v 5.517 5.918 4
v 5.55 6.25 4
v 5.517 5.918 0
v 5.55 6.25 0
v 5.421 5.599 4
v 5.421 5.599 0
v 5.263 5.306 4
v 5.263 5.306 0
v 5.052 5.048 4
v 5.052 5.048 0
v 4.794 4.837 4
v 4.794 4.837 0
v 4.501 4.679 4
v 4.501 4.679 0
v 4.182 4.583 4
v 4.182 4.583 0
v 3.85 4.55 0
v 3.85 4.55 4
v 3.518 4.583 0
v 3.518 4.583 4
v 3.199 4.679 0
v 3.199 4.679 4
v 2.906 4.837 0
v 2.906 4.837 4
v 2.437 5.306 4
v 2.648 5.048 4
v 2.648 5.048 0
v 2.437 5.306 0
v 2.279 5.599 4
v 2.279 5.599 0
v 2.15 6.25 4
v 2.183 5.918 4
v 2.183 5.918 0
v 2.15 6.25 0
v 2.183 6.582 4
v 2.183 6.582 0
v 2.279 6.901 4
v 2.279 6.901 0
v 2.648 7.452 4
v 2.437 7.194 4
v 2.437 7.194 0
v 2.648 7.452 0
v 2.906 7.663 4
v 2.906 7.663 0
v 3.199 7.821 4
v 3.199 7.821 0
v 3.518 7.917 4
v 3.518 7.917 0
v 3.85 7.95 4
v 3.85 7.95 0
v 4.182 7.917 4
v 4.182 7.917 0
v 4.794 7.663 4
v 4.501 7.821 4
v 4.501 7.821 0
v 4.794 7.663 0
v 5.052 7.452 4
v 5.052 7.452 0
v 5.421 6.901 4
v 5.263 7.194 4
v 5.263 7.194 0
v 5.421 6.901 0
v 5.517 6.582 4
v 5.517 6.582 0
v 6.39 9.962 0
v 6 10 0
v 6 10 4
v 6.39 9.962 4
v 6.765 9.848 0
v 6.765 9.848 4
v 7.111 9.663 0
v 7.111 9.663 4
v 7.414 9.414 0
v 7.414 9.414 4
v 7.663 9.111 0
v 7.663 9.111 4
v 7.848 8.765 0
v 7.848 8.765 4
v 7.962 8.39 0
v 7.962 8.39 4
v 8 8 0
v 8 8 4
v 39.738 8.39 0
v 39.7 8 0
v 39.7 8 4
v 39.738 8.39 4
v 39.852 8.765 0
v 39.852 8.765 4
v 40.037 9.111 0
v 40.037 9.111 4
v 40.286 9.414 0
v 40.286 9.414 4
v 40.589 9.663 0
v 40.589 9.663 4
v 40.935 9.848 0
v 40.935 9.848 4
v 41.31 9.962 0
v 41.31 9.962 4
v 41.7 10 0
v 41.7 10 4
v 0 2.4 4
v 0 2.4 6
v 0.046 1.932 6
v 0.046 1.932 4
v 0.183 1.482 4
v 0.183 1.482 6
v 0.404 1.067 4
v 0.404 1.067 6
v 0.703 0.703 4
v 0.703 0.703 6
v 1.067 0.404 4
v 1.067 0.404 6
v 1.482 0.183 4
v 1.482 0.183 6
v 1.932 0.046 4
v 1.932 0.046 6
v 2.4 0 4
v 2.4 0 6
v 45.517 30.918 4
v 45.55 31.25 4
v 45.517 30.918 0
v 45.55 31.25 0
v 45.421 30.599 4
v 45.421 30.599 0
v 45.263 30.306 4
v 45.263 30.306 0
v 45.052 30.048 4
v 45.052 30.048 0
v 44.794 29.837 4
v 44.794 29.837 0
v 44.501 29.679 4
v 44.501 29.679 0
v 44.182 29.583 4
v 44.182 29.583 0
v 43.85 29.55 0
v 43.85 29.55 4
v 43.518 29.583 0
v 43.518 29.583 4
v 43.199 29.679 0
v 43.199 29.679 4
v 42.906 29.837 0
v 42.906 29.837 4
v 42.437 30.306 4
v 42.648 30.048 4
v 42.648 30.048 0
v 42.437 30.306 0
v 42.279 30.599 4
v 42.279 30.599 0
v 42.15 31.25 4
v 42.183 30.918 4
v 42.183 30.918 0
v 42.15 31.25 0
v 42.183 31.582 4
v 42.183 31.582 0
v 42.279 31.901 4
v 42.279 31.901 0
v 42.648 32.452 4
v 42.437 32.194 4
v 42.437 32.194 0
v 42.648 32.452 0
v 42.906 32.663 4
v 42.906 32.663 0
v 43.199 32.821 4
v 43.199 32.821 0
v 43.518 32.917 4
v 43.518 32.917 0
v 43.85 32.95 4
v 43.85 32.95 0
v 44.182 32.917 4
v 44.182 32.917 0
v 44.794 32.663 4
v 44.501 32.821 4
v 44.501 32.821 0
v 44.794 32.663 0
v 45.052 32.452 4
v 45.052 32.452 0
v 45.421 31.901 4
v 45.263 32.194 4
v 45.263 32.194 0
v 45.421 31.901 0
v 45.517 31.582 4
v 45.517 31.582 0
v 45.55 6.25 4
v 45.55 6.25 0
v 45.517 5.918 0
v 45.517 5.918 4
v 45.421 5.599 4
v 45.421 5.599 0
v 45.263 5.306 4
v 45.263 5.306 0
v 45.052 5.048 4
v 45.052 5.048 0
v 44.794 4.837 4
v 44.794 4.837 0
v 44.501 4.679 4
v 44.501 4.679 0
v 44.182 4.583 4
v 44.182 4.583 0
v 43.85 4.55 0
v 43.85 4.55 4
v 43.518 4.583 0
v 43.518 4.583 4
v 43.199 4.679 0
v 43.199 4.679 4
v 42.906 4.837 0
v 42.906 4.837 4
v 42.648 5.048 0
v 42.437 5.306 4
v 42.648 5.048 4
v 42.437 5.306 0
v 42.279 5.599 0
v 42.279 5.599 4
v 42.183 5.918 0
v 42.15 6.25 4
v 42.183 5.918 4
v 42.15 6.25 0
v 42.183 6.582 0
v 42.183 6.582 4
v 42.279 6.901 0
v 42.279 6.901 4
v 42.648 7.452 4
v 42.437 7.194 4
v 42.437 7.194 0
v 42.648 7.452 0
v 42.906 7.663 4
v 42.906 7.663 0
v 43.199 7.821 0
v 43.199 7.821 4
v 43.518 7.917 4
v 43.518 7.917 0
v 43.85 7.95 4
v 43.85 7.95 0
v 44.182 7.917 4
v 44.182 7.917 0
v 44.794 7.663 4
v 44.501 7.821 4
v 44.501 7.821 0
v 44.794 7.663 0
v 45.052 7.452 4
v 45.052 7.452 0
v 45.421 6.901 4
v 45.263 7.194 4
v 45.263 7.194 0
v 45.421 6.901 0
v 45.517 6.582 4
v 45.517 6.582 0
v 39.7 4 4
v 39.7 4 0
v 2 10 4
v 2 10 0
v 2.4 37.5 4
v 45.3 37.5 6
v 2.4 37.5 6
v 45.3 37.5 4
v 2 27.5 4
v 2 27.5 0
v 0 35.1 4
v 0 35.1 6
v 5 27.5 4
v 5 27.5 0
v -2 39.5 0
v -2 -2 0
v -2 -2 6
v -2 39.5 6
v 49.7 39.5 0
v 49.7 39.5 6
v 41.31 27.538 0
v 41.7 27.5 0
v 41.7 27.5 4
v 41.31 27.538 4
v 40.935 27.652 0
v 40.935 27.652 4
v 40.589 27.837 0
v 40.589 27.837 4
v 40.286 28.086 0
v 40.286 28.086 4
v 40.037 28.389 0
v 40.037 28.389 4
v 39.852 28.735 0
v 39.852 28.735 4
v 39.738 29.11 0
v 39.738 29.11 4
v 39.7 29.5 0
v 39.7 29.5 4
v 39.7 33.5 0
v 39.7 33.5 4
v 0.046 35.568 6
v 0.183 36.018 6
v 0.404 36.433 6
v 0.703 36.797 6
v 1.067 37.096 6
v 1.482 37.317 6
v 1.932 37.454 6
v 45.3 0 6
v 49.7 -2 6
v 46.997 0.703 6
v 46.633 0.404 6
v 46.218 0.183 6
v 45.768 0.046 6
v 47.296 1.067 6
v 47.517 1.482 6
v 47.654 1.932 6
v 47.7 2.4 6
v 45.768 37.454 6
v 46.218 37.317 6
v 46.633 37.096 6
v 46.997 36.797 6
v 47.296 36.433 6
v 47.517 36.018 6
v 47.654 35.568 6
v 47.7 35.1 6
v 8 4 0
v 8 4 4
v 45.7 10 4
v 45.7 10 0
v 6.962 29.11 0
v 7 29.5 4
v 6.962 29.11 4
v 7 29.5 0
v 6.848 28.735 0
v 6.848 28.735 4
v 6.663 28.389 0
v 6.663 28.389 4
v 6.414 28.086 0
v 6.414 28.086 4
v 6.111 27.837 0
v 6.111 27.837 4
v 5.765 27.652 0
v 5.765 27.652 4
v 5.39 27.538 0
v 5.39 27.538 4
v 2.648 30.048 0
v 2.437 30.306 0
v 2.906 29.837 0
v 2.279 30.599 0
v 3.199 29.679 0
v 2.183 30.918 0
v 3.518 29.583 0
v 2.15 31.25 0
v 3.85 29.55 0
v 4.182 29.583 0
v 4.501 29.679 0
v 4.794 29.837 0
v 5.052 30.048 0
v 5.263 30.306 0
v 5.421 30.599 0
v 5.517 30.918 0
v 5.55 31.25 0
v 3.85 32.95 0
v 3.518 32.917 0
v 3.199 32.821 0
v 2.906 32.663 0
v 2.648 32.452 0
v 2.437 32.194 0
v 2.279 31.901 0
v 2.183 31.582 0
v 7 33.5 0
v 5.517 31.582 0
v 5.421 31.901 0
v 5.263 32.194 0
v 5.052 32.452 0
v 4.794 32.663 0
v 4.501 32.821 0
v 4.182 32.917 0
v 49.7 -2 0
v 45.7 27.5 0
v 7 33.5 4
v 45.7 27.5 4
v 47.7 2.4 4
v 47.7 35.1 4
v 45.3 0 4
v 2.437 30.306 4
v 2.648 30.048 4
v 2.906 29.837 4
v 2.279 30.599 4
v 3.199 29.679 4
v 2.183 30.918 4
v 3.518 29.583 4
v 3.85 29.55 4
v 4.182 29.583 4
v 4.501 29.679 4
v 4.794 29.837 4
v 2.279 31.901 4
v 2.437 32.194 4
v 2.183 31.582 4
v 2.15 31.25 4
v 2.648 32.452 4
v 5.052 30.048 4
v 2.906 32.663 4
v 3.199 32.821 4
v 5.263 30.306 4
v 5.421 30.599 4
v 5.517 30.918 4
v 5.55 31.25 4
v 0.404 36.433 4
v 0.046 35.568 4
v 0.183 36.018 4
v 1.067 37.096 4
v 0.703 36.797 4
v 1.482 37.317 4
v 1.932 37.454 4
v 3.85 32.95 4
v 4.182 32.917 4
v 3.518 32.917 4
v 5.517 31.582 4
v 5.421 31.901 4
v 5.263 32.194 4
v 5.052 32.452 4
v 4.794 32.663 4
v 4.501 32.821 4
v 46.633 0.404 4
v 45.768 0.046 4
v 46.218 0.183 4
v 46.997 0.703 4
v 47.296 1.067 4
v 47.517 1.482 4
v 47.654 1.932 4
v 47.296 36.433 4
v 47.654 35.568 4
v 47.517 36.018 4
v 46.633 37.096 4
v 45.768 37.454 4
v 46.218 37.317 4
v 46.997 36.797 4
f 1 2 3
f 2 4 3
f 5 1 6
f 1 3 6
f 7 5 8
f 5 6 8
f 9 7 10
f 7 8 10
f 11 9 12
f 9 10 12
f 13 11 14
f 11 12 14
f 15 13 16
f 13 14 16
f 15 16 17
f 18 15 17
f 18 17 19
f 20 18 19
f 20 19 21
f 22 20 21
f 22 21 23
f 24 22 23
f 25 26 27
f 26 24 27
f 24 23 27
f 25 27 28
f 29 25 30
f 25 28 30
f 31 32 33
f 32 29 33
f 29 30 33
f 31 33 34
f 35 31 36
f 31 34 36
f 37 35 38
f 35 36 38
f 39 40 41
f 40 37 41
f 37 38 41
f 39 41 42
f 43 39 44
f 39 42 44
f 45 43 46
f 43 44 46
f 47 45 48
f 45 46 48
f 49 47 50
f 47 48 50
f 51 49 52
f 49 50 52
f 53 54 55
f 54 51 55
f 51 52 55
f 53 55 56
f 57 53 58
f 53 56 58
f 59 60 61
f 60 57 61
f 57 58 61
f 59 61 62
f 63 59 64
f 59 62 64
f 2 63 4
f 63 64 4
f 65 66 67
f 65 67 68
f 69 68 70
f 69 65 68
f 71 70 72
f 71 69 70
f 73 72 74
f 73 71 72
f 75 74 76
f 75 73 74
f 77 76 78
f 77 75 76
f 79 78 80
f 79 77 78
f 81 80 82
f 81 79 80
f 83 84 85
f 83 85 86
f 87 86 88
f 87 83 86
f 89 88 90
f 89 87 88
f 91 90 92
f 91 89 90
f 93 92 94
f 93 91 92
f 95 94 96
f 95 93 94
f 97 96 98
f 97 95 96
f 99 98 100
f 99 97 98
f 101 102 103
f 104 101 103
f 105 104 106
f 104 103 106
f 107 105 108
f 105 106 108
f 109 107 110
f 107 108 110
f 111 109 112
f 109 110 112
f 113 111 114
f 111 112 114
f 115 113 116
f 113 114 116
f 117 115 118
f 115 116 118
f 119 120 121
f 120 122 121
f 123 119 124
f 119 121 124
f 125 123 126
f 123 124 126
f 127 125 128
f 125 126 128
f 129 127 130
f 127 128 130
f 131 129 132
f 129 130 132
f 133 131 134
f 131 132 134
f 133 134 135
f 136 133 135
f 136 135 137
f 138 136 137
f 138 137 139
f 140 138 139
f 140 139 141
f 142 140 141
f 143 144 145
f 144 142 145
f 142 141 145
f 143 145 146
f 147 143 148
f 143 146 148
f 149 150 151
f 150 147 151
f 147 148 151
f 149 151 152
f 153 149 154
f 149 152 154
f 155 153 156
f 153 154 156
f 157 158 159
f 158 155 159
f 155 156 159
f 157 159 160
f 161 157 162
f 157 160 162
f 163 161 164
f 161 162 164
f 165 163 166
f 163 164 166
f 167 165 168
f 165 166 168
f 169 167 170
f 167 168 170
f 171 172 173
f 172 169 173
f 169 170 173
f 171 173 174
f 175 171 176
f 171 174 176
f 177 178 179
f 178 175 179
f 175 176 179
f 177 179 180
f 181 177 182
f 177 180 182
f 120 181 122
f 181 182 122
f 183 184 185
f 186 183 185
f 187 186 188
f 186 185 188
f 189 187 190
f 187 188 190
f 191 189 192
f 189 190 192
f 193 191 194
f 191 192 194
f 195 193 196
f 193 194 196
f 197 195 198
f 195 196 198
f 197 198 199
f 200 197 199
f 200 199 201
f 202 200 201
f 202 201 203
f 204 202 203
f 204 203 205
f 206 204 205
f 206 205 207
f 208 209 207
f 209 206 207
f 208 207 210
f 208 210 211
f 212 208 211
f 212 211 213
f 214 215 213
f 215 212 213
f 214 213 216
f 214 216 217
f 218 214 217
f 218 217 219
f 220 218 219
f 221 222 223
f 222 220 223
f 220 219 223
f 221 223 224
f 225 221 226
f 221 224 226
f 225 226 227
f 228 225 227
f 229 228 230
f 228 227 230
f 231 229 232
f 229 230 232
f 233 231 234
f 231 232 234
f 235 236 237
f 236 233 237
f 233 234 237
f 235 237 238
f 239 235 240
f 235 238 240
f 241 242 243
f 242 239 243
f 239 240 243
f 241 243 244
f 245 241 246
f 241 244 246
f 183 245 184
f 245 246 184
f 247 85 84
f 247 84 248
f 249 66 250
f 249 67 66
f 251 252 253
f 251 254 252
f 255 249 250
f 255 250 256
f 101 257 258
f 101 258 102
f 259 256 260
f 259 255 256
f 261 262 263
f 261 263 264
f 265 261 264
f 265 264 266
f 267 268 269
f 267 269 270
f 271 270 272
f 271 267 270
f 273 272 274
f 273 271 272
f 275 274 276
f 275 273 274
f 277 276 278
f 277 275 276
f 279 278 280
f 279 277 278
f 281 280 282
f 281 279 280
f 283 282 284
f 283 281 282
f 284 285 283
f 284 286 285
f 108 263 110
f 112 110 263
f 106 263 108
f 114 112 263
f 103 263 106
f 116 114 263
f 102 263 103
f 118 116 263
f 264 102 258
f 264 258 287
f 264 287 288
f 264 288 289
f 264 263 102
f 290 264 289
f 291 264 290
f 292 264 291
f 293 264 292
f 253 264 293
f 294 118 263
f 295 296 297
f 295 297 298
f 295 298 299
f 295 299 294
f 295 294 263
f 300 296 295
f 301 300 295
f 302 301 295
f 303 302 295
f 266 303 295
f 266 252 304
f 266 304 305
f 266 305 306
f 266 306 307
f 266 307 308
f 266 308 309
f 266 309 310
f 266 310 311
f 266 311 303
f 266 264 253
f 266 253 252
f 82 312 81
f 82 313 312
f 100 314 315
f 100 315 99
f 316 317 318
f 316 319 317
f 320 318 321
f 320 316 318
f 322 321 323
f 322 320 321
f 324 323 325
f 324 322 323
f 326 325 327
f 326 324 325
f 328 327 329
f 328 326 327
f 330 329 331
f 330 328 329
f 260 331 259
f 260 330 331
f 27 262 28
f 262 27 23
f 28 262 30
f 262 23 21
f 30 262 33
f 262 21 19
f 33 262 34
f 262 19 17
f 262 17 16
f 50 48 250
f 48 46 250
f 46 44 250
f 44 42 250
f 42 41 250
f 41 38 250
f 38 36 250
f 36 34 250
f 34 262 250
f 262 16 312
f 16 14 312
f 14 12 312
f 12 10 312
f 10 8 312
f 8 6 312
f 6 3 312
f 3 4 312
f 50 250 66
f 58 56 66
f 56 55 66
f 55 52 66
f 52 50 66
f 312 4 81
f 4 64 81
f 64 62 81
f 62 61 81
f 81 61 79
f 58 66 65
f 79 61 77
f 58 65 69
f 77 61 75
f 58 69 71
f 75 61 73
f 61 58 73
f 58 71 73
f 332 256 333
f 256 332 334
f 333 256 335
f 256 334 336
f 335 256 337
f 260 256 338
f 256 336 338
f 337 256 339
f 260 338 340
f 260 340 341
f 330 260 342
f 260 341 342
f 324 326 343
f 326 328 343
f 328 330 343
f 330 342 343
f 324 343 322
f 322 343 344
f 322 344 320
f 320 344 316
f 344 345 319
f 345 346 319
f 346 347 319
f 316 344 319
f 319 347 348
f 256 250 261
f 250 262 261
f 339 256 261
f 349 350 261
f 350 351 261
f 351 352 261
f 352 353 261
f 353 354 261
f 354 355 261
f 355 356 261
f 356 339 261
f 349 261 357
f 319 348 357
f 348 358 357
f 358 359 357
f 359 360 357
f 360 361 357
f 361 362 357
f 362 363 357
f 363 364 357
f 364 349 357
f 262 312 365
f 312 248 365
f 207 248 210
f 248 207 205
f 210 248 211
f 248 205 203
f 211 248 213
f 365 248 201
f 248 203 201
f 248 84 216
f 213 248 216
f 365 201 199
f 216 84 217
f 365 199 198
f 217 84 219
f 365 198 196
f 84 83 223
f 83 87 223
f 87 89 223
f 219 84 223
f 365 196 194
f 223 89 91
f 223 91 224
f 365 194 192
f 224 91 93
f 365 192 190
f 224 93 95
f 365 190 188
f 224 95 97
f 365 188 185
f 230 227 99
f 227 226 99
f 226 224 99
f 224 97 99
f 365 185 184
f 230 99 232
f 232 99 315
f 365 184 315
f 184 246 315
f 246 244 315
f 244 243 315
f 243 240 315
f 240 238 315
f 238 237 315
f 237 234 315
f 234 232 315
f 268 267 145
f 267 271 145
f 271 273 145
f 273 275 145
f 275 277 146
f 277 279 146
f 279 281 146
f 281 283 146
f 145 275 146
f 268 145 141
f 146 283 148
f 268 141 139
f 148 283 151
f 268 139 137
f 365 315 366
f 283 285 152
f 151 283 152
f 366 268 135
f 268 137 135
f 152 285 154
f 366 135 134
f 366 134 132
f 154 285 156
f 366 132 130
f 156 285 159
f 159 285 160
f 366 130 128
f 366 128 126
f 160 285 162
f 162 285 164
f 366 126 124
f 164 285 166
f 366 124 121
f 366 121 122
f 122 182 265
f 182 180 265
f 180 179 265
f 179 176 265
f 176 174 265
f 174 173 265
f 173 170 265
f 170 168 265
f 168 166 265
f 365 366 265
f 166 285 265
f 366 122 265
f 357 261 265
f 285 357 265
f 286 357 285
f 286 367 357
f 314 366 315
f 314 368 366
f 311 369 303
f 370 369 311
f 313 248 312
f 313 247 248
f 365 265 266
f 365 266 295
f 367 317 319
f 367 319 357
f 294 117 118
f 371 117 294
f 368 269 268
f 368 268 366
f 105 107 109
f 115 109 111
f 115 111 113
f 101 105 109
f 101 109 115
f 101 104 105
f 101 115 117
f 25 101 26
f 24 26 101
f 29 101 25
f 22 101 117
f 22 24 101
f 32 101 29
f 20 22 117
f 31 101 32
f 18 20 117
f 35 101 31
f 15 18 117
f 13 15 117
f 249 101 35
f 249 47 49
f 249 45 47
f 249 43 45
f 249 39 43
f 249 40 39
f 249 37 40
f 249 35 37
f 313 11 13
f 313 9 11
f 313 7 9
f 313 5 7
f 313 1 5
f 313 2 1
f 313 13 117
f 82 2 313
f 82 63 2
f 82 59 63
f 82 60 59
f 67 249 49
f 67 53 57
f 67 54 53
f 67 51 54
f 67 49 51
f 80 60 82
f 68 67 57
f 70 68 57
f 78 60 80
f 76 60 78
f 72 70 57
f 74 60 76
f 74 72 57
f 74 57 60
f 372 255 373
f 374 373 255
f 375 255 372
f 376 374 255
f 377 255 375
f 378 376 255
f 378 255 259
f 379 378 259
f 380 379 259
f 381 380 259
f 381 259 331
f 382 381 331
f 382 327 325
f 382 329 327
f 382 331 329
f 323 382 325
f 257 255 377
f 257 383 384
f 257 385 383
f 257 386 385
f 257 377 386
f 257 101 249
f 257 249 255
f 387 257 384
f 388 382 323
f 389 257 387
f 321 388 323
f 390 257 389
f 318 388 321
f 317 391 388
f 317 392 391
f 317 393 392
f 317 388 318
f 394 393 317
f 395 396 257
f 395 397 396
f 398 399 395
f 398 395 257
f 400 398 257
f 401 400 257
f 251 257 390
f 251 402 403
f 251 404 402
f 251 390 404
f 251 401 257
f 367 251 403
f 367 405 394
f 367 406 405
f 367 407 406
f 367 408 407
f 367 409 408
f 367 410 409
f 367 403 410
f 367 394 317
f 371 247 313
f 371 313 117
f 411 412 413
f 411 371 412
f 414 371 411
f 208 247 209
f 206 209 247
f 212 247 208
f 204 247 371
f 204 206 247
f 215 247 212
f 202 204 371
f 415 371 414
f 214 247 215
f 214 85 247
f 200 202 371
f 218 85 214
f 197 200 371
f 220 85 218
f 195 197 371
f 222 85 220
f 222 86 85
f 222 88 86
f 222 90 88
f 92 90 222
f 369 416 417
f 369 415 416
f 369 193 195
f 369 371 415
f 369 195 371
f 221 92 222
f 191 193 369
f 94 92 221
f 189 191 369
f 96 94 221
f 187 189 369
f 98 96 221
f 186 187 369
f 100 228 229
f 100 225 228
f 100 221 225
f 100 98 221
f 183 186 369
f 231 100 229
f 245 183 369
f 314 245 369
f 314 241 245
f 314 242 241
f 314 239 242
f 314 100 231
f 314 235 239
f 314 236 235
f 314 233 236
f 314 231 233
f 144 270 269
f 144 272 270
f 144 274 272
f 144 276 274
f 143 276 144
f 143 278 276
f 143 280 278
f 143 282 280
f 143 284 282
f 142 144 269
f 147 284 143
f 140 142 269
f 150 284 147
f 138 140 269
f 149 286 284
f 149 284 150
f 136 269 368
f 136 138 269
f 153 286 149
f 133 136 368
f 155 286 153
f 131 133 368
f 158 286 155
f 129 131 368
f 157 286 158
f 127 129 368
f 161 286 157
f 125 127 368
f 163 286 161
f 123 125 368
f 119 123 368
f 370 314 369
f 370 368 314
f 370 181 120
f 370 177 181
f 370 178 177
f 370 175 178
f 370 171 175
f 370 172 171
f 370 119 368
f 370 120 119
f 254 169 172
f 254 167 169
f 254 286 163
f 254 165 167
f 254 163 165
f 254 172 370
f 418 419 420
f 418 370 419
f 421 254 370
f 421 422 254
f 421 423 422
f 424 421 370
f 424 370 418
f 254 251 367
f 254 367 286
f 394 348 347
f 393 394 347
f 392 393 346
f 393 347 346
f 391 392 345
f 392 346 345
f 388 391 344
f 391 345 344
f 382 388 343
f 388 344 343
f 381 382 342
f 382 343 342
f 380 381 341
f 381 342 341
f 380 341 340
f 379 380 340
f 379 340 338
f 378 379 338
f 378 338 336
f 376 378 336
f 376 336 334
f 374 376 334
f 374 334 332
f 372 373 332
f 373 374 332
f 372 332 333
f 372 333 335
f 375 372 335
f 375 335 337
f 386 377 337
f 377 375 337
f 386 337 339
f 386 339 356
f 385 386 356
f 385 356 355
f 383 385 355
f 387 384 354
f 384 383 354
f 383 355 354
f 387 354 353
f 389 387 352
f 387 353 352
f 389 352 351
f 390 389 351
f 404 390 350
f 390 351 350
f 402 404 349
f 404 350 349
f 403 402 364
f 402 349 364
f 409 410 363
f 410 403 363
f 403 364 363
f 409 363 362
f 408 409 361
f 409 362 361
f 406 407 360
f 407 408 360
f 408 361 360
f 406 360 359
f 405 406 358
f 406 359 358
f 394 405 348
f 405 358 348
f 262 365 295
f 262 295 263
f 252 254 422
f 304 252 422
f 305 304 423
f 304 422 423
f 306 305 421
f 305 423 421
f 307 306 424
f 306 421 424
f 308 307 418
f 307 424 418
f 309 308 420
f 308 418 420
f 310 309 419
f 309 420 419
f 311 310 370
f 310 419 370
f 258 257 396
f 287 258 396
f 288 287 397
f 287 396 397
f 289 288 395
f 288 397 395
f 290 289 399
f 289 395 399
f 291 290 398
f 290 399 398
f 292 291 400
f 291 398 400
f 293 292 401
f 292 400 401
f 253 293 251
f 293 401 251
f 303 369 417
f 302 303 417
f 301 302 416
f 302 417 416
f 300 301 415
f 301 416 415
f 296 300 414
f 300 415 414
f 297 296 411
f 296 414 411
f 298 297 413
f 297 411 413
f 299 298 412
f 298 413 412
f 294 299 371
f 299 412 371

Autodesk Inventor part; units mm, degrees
ref_plane "YZ Plane" through (0, 0, 0) normal (1, 0, 0) x (0, 1, 0)
ref_plane "XZ Plane" through (0, 0, 0) normal (0, 1, 0) x (-1, 0, 0)
ref_plane "XY Plane" through (0, 0, 0) normal (0, 0, 1) x (1, 0, 0)
sketch "Эскиз1" plane through (0, 0, 0) normal (0, 0, 1) x (1, 0, 0)
  line L0 (0, 0) -> (47.7, 0)
  line L1 (47.7, 0) -> (47.7, 37.5)
  line L2 (47.7, 37.5) -> (0, 37.5)
  line L3 (0, 37.5) -> (0, 0)
  line L4 (3.85, 31.25) -> (43.85, 31.25) construction
  line L5 (43.85, 31.25) -> (43.85, 6.25) construction
  line L6 (43.85, 6.25) -> (3.85, 6.25) construction
  line L7 (3.85, 6.25) -> (3.85, 31.25) construction
  line L8 (3.85, 31.25) -> (3.85, 37.5) construction
  line L9 (3.85, 6.25) -> (3.85, 0) construction
  line L10 (3.85, 31.25) -> (0, 31.25) construction
  line L11 (43.85, 31.25) -> (47.7, 31.25) construction
  circle A0 centre (3.85, 31.25) radius 1.7
  circle A1 centre (43.85, 31.25) radius 1.7
  circle A2 centre (43.85, 6.25) radius 1.7
  circle A3 centre (3.85, 6.25) radius 1.7
  dimension "d0" = 47.7
  dimension "d1" = 37.5
  dimension "d2" = 40
  dimension "d3" = 25
  dimension "d6" = 3.4
extrude "Выдавливание1" add sketch "Эскиз1" along normal blind 4
sketch "Эскиз2" plane through (0, 0, 4) normal (0, 0, 1) x (1, 0, 0)
  circle A0 centre (3.85, 6.25) radius 1.7 projected
  circle A1 centre (43.85, 6.25) radius 1.7 projected
  circle A2 centre (43.85, 31.25) radius 1.7 projected
  circle A3 centre (3.85, 31.25) radius 1.7 projected
  line L0 (0, 0) -> (47.7, 0) projected
  line L1 (47.7, 0) -> (47.7, 37.5) projected
  line L2 (47.7, 37.5) -> (0, 37.5) projected
  line L3 (0, 37.5) -> (0, 0) projected
  line L4 (-2, 39.5) -> (49.7, 39.5)
  line L5 (49.7, 39.5) -> (49.7, -2)
  line L6 (49.7, -2) -> (-2, -2)
  line L7 (-2, -2) -> (-2, 39.5)
  dimension "d9" = 2
extrude "Выдавливание2" add sketch "Эскиз2" along normal blind 2 and the other way blind 4 contours L4 L5 L6 L7
fillet "Сопряжение1" radius 2.4 4 edges at (0, 37.5, 5) (47.7, 37.5, 5) (47.7, 0, 5) (0, 0, 5)
sketch "Эскиз3" plane through (0, 0, 4) normal (0, 0, 1) x (1, 0, 0)
  line L0 (7, 33.5) -> (39.7, 33.5)
  line L1 (39.7, 4) -> (8, 4)
  line L2 (2.4, 37.5) -> (45.3, 37.5) projected
  line L3 (47.7, 35.1) -> (47.7, 2.4) projected
  line L4 (2, 27.5) -> (7, 27.5)
  line L5 (8, 10) -> (2, 10)
  line L6 (2, 10) -> (2, 27.5)
  line L7 (39.7, 27.5) -> (45.7, 27.5)
  line L8 (45.7, 27.5) -> (45.7, 10)
  line L9 (45.7, 10) -> (39.7, 10)
  line L10 (45.3, 0) -> (2.4, 0) projected
  line L11 (0, 2.4) -> (0, 35.1) projected
  line L12 (8, 4) -> (8, 10)
  line L13 (7, 27.5) -> (7, 33.5)
  line L14 (39.7, 33.5) -> (39.7, 27.5)
  line L15 (39.7, 10) -> (39.7, 4)
  point P0 (0, 0)
  dimension "d15" = 4
  dimension "d17" = 4
  dimension "d24" = 10
  dimension "d25" = 10
  dimension "d26" = 10
  dimension "d27" = 10
  dimension "d28" = 2
  dimension "d29" = 2
  dimension "d33" = 8
  dimension "d34" = 7
  dimension "d35" = 8
  dimension "d36" = 8
extrude "Выдавливание3" cut sketch "Эскиз3" against normal blind 10
fillet "Сопряжение2" radius 2 4 edges at (8, 10, 2) (7, 27.5, 2) (39.7, 27.5, 2) (39.7, 10, 2)
properties part number "forpower"
